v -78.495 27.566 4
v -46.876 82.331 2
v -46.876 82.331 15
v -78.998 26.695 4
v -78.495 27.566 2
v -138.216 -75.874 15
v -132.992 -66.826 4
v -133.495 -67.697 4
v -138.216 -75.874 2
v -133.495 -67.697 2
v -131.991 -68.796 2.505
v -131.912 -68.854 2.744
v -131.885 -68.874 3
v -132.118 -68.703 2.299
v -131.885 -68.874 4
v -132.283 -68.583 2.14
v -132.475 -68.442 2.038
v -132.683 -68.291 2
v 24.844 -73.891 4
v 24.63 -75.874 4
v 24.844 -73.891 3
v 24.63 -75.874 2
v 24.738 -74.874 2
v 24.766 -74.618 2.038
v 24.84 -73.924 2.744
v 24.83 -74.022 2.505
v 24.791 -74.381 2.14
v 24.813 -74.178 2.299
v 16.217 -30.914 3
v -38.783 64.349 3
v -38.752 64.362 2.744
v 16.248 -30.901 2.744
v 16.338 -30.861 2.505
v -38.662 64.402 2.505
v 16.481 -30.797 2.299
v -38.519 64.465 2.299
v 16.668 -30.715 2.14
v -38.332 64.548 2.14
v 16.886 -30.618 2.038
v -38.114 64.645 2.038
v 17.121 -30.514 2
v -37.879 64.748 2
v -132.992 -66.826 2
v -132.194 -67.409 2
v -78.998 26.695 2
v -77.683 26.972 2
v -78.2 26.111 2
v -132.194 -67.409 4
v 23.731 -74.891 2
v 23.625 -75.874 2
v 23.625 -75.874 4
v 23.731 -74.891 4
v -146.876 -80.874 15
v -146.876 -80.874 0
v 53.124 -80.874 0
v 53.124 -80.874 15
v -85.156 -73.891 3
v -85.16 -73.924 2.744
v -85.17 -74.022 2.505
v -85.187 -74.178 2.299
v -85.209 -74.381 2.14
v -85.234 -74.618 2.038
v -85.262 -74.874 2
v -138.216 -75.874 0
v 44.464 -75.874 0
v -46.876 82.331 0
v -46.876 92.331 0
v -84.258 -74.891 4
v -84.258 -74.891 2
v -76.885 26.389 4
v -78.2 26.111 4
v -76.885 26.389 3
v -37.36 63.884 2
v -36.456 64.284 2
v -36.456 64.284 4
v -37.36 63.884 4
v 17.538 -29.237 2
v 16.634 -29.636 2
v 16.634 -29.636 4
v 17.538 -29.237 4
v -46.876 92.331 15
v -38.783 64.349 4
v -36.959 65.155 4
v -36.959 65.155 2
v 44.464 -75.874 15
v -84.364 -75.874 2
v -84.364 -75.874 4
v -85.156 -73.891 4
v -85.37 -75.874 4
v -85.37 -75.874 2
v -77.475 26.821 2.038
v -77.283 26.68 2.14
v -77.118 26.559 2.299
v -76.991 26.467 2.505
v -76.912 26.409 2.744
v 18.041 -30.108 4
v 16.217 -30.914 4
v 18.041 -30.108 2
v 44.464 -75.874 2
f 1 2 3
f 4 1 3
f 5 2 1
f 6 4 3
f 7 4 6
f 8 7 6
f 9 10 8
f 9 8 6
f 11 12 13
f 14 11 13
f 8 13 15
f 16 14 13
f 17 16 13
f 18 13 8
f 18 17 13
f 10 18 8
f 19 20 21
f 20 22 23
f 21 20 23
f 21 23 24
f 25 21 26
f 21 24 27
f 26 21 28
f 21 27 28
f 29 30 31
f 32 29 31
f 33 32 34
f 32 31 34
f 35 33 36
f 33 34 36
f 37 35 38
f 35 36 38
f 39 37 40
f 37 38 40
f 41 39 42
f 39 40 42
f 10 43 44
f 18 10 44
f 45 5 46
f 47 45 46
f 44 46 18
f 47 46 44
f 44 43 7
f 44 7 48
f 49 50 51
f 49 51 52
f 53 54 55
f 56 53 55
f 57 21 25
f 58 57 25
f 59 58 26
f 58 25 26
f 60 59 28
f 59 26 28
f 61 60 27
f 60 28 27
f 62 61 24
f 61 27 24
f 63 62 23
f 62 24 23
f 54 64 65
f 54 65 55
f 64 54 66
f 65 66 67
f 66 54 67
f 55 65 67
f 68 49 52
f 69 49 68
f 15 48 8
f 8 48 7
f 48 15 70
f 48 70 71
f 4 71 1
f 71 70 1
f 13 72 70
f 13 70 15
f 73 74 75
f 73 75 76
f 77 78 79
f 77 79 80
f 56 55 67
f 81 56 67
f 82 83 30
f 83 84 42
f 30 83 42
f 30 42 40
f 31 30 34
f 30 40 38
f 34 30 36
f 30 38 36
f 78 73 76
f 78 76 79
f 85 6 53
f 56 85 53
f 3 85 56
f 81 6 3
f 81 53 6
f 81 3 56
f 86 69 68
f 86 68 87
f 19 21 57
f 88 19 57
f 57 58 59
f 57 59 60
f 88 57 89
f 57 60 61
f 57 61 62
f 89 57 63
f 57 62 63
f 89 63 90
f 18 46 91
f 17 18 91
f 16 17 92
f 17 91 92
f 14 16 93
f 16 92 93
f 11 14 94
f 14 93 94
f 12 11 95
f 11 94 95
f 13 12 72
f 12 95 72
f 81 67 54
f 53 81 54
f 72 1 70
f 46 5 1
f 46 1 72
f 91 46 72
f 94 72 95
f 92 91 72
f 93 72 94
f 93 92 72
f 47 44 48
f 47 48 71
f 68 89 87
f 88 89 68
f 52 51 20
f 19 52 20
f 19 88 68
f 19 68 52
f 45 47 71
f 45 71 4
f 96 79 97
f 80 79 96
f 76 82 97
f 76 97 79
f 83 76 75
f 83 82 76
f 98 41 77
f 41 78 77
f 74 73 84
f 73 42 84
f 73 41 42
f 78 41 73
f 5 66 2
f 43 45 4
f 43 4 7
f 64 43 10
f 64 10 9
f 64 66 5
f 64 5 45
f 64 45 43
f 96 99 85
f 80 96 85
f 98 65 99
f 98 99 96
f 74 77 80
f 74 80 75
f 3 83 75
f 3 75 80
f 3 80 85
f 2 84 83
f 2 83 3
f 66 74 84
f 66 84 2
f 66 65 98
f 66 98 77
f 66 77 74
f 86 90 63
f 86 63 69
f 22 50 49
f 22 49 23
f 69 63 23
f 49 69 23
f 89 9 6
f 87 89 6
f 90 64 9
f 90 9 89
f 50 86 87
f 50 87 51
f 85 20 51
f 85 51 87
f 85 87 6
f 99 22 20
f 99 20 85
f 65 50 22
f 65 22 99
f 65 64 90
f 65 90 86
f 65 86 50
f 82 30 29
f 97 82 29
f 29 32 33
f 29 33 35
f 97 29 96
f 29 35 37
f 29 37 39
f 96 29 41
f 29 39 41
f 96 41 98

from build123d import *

# Parameters (mm, degrees)
BOSS_EXTRU_1_DEPTH      = 15
BOSS_EXTRU_2_DEPTH      = 2
BOSS_EXTRU_5_DEPTH      = 2
CONG_1_R                = 1
ENL_V_MAT_EXTRU_1_DEPTH = 2


with BuildPart() as part:
    # Esquisse1 → Boss.-Extru.1 (new body)
    with BuildSketch(Plane.XY):
        Polygon((-46.875775887, 92.331472327), (-146.875775887, -80.87360843), (53.124224113, -80.87360843), align=None)
        Polygon((44.463970075, -75.87360843), (-46.875775887, 82.331472327), (-138.21552185, -75.87360843), align=None, mode=Mode.SUBTRACT)
    extrude(amount=BOSS_EXTRU_1_DEPTH)

    # Esquisse2 → Boss.-Extru.2 (add)
    with BuildSketch(Plane(origin=(0, 0, 0), x_dir=(-1, 0, 0), z_dir=(0, 0, -1))):
        Polygon((-53.124224113, -80.87360843), (146.875775887, -80.87360843), (46.875775887, 92.331472327), align=None)
        Polygon((-42.731919267, -74.87360843), (136.483471042, -74.87360843), (46.875775887, 80.331472327), align=None, mode=Mode.SUBTRACT)
    extrude(amount=-BOSS_EXTRU_2_DEPTH)

    # Esquisse3 → Boss.-Extru.5 (add)
    # profile 1 of 3: a face of its own
    with BuildSketch(Plane.XY.offset(2)):
        Polygon((-76.884598102, 26.389185986), (-131.884598102, -68.87360843), (-134.307058992, -67.103952181), (-79.307058992, 28.158842235), align=None)
        Polygon((-78.199650653, 26.111448154), (-78.997792799, 26.694506994), (-132.992006441, -66.826214349), (-132.193864295, -67.409273189), align=None, mode=Mode.SUBTRACT)
    # profile 2 of 3: a face of its own
    with BuildSketch(Plane.XY.offset(2)):
        Polygon((16.217092488, -30.914062884), (18.960890201, -29.700978339), (-36.039109799, 65.561816078), (-38.782907512, 64.348731532), align=None)
        Polygon((16.634090745, -29.636325052), (17.538105586, -29.236643098), (-36.456108056, 64.284078245), (-37.360122897, 63.884396291), align=None, mode=Mode.SUBTRACT)
    # profile 3 of 3: a face of its own
    with BuildSketch(Plane.XY.offset(2)):
        Polygon((-85.155974471, -73.890867636), (-85.477311293, -76.87360843), (24.522688707, -76.87360843), (24.844025529, -73.890867636), align=None)
        Polygon((-84.257920177, -74.890867636), (-84.363792871, -75.87360843), (23.624634413, -75.87360843), (23.730507107, -74.890867636), align=None, mode=Mode.SUBTRACT)
    extrude(amount=BOSS_EXTRU_5_DEPTH)

    # Congé1
    # the kernel refuses this fillet: 1 mm, written as the material it takes off along each edge
    with BuildSketch(Plane(origin=(-40.032907512, 66.513795042, 2), x_dir=(0.8660254037844388, 0.49999999999999967, 0), z_dir=(0.49999999999999967, -0.8660254037844388, 0))) as cong_1_piece_1_section:
        with BuildLine():
            CenterArc((CONG_1_R, CONG_1_R), CONG_1_R, 180, 90)
            Line((0, CONG_1_R), (0, 0))
            Line((0, 0), (CONG_1_R, 0))
        make_face()
    cong_1_piece_1 = extrude(amount=115, mode=Mode.PRIVATE)
    cong_1_piece_1 = split(cong_1_piece_1, bisect_by=Plane(origin=(-10.431829018, 17.208704721, 2.226716308), z_dir=(-0.8660254037844386, -0.5000000000000001, 0)), keep=Keep.TOP, mode=Mode.PRIVATE)
    add(cong_1_piece_1, mode=Mode.SUBTRACT)
    with BuildSketch(Plane(origin=(-75.634598102, 28.554249495, 2), x_dir=(-0.8660254037844388, 0.4999999999999997, 0), z_dir=(-0.4999999999999997, -0.8660254037844388, 0))) as cong_1_piece_2_section:
        with BuildLine():
            CenterArc((CONG_1_R, -CONG_1_R), CONG_1_R, 90, 90)
            Line((0, -CONG_1_R), (0, 0))
            Line((0, 0), (CONG_1_R, 0))
        make_face()
    cong_1_piece_2 = extrude(amount=115, mode=Mode.PRIVATE)
    cong_1_piece_2 = split(cong_1_piece_2, bisect_by=Plane(origin=(-105.235676596, -20.750840825, 2.226716308), z_dir=(0.8660254037844387, -0.5000000000000001, 0)), keep=Keep.TOP, mode=Mode.PRIVATE)
    add(cong_1_piece_2, mode=Mode.SUBTRACT)
    with BuildSketch(Plane(origin=(27.344025529, -73.890867636, 2), x_dir=(0, -1, 0), z_dir=(-1, 0, 0))) as cong_1_piece_3_section:
        with BuildLine():
            CenterArc((CONG_1_R, CONG_1_R), CONG_1_R, 180, 90)
            Line((0, CONG_1_R), (0, 0))
            Line((0, 0), (CONG_1_R, 0))
        make_face()
    cong_1_piece_3 = extrude(amount=115, mode=Mode.PRIVATE)
    cong_1_piece_3 = split(cong_1_piece_3, bisect_by=Plane(origin=(-30.155974471, -74.87360843, 2.226716308), z_dir=(0, 1, 0)), keep=Keep.TOP, mode=Mode.PRIVATE)
    add(cong_1_piece_3, mode=Mode.SUBTRACT)

    # Esquisse3D1 → Enlèv. mat.-Extru.1 (cut)
    with BuildSketch(Plane(origin=(-138.21552185, -75.87360843, 0), x_dir=(1, 0, 0), z_dir=(0, 0, 1))):
        Polygon((0, 0), (182.679491924, 0), (91.339745962, 158.205080757), align=None)
        Polygon((1.732050808, 1), (180.947441117, 1), (91.339745962, 156.205080757), align=None, mode=Mode.SUBTRACT)
    extrude(amount=ENL_V_MAT_EXTRU_1_DEPTH, mode=Mode.SUBTRACT)


solid = part.part
